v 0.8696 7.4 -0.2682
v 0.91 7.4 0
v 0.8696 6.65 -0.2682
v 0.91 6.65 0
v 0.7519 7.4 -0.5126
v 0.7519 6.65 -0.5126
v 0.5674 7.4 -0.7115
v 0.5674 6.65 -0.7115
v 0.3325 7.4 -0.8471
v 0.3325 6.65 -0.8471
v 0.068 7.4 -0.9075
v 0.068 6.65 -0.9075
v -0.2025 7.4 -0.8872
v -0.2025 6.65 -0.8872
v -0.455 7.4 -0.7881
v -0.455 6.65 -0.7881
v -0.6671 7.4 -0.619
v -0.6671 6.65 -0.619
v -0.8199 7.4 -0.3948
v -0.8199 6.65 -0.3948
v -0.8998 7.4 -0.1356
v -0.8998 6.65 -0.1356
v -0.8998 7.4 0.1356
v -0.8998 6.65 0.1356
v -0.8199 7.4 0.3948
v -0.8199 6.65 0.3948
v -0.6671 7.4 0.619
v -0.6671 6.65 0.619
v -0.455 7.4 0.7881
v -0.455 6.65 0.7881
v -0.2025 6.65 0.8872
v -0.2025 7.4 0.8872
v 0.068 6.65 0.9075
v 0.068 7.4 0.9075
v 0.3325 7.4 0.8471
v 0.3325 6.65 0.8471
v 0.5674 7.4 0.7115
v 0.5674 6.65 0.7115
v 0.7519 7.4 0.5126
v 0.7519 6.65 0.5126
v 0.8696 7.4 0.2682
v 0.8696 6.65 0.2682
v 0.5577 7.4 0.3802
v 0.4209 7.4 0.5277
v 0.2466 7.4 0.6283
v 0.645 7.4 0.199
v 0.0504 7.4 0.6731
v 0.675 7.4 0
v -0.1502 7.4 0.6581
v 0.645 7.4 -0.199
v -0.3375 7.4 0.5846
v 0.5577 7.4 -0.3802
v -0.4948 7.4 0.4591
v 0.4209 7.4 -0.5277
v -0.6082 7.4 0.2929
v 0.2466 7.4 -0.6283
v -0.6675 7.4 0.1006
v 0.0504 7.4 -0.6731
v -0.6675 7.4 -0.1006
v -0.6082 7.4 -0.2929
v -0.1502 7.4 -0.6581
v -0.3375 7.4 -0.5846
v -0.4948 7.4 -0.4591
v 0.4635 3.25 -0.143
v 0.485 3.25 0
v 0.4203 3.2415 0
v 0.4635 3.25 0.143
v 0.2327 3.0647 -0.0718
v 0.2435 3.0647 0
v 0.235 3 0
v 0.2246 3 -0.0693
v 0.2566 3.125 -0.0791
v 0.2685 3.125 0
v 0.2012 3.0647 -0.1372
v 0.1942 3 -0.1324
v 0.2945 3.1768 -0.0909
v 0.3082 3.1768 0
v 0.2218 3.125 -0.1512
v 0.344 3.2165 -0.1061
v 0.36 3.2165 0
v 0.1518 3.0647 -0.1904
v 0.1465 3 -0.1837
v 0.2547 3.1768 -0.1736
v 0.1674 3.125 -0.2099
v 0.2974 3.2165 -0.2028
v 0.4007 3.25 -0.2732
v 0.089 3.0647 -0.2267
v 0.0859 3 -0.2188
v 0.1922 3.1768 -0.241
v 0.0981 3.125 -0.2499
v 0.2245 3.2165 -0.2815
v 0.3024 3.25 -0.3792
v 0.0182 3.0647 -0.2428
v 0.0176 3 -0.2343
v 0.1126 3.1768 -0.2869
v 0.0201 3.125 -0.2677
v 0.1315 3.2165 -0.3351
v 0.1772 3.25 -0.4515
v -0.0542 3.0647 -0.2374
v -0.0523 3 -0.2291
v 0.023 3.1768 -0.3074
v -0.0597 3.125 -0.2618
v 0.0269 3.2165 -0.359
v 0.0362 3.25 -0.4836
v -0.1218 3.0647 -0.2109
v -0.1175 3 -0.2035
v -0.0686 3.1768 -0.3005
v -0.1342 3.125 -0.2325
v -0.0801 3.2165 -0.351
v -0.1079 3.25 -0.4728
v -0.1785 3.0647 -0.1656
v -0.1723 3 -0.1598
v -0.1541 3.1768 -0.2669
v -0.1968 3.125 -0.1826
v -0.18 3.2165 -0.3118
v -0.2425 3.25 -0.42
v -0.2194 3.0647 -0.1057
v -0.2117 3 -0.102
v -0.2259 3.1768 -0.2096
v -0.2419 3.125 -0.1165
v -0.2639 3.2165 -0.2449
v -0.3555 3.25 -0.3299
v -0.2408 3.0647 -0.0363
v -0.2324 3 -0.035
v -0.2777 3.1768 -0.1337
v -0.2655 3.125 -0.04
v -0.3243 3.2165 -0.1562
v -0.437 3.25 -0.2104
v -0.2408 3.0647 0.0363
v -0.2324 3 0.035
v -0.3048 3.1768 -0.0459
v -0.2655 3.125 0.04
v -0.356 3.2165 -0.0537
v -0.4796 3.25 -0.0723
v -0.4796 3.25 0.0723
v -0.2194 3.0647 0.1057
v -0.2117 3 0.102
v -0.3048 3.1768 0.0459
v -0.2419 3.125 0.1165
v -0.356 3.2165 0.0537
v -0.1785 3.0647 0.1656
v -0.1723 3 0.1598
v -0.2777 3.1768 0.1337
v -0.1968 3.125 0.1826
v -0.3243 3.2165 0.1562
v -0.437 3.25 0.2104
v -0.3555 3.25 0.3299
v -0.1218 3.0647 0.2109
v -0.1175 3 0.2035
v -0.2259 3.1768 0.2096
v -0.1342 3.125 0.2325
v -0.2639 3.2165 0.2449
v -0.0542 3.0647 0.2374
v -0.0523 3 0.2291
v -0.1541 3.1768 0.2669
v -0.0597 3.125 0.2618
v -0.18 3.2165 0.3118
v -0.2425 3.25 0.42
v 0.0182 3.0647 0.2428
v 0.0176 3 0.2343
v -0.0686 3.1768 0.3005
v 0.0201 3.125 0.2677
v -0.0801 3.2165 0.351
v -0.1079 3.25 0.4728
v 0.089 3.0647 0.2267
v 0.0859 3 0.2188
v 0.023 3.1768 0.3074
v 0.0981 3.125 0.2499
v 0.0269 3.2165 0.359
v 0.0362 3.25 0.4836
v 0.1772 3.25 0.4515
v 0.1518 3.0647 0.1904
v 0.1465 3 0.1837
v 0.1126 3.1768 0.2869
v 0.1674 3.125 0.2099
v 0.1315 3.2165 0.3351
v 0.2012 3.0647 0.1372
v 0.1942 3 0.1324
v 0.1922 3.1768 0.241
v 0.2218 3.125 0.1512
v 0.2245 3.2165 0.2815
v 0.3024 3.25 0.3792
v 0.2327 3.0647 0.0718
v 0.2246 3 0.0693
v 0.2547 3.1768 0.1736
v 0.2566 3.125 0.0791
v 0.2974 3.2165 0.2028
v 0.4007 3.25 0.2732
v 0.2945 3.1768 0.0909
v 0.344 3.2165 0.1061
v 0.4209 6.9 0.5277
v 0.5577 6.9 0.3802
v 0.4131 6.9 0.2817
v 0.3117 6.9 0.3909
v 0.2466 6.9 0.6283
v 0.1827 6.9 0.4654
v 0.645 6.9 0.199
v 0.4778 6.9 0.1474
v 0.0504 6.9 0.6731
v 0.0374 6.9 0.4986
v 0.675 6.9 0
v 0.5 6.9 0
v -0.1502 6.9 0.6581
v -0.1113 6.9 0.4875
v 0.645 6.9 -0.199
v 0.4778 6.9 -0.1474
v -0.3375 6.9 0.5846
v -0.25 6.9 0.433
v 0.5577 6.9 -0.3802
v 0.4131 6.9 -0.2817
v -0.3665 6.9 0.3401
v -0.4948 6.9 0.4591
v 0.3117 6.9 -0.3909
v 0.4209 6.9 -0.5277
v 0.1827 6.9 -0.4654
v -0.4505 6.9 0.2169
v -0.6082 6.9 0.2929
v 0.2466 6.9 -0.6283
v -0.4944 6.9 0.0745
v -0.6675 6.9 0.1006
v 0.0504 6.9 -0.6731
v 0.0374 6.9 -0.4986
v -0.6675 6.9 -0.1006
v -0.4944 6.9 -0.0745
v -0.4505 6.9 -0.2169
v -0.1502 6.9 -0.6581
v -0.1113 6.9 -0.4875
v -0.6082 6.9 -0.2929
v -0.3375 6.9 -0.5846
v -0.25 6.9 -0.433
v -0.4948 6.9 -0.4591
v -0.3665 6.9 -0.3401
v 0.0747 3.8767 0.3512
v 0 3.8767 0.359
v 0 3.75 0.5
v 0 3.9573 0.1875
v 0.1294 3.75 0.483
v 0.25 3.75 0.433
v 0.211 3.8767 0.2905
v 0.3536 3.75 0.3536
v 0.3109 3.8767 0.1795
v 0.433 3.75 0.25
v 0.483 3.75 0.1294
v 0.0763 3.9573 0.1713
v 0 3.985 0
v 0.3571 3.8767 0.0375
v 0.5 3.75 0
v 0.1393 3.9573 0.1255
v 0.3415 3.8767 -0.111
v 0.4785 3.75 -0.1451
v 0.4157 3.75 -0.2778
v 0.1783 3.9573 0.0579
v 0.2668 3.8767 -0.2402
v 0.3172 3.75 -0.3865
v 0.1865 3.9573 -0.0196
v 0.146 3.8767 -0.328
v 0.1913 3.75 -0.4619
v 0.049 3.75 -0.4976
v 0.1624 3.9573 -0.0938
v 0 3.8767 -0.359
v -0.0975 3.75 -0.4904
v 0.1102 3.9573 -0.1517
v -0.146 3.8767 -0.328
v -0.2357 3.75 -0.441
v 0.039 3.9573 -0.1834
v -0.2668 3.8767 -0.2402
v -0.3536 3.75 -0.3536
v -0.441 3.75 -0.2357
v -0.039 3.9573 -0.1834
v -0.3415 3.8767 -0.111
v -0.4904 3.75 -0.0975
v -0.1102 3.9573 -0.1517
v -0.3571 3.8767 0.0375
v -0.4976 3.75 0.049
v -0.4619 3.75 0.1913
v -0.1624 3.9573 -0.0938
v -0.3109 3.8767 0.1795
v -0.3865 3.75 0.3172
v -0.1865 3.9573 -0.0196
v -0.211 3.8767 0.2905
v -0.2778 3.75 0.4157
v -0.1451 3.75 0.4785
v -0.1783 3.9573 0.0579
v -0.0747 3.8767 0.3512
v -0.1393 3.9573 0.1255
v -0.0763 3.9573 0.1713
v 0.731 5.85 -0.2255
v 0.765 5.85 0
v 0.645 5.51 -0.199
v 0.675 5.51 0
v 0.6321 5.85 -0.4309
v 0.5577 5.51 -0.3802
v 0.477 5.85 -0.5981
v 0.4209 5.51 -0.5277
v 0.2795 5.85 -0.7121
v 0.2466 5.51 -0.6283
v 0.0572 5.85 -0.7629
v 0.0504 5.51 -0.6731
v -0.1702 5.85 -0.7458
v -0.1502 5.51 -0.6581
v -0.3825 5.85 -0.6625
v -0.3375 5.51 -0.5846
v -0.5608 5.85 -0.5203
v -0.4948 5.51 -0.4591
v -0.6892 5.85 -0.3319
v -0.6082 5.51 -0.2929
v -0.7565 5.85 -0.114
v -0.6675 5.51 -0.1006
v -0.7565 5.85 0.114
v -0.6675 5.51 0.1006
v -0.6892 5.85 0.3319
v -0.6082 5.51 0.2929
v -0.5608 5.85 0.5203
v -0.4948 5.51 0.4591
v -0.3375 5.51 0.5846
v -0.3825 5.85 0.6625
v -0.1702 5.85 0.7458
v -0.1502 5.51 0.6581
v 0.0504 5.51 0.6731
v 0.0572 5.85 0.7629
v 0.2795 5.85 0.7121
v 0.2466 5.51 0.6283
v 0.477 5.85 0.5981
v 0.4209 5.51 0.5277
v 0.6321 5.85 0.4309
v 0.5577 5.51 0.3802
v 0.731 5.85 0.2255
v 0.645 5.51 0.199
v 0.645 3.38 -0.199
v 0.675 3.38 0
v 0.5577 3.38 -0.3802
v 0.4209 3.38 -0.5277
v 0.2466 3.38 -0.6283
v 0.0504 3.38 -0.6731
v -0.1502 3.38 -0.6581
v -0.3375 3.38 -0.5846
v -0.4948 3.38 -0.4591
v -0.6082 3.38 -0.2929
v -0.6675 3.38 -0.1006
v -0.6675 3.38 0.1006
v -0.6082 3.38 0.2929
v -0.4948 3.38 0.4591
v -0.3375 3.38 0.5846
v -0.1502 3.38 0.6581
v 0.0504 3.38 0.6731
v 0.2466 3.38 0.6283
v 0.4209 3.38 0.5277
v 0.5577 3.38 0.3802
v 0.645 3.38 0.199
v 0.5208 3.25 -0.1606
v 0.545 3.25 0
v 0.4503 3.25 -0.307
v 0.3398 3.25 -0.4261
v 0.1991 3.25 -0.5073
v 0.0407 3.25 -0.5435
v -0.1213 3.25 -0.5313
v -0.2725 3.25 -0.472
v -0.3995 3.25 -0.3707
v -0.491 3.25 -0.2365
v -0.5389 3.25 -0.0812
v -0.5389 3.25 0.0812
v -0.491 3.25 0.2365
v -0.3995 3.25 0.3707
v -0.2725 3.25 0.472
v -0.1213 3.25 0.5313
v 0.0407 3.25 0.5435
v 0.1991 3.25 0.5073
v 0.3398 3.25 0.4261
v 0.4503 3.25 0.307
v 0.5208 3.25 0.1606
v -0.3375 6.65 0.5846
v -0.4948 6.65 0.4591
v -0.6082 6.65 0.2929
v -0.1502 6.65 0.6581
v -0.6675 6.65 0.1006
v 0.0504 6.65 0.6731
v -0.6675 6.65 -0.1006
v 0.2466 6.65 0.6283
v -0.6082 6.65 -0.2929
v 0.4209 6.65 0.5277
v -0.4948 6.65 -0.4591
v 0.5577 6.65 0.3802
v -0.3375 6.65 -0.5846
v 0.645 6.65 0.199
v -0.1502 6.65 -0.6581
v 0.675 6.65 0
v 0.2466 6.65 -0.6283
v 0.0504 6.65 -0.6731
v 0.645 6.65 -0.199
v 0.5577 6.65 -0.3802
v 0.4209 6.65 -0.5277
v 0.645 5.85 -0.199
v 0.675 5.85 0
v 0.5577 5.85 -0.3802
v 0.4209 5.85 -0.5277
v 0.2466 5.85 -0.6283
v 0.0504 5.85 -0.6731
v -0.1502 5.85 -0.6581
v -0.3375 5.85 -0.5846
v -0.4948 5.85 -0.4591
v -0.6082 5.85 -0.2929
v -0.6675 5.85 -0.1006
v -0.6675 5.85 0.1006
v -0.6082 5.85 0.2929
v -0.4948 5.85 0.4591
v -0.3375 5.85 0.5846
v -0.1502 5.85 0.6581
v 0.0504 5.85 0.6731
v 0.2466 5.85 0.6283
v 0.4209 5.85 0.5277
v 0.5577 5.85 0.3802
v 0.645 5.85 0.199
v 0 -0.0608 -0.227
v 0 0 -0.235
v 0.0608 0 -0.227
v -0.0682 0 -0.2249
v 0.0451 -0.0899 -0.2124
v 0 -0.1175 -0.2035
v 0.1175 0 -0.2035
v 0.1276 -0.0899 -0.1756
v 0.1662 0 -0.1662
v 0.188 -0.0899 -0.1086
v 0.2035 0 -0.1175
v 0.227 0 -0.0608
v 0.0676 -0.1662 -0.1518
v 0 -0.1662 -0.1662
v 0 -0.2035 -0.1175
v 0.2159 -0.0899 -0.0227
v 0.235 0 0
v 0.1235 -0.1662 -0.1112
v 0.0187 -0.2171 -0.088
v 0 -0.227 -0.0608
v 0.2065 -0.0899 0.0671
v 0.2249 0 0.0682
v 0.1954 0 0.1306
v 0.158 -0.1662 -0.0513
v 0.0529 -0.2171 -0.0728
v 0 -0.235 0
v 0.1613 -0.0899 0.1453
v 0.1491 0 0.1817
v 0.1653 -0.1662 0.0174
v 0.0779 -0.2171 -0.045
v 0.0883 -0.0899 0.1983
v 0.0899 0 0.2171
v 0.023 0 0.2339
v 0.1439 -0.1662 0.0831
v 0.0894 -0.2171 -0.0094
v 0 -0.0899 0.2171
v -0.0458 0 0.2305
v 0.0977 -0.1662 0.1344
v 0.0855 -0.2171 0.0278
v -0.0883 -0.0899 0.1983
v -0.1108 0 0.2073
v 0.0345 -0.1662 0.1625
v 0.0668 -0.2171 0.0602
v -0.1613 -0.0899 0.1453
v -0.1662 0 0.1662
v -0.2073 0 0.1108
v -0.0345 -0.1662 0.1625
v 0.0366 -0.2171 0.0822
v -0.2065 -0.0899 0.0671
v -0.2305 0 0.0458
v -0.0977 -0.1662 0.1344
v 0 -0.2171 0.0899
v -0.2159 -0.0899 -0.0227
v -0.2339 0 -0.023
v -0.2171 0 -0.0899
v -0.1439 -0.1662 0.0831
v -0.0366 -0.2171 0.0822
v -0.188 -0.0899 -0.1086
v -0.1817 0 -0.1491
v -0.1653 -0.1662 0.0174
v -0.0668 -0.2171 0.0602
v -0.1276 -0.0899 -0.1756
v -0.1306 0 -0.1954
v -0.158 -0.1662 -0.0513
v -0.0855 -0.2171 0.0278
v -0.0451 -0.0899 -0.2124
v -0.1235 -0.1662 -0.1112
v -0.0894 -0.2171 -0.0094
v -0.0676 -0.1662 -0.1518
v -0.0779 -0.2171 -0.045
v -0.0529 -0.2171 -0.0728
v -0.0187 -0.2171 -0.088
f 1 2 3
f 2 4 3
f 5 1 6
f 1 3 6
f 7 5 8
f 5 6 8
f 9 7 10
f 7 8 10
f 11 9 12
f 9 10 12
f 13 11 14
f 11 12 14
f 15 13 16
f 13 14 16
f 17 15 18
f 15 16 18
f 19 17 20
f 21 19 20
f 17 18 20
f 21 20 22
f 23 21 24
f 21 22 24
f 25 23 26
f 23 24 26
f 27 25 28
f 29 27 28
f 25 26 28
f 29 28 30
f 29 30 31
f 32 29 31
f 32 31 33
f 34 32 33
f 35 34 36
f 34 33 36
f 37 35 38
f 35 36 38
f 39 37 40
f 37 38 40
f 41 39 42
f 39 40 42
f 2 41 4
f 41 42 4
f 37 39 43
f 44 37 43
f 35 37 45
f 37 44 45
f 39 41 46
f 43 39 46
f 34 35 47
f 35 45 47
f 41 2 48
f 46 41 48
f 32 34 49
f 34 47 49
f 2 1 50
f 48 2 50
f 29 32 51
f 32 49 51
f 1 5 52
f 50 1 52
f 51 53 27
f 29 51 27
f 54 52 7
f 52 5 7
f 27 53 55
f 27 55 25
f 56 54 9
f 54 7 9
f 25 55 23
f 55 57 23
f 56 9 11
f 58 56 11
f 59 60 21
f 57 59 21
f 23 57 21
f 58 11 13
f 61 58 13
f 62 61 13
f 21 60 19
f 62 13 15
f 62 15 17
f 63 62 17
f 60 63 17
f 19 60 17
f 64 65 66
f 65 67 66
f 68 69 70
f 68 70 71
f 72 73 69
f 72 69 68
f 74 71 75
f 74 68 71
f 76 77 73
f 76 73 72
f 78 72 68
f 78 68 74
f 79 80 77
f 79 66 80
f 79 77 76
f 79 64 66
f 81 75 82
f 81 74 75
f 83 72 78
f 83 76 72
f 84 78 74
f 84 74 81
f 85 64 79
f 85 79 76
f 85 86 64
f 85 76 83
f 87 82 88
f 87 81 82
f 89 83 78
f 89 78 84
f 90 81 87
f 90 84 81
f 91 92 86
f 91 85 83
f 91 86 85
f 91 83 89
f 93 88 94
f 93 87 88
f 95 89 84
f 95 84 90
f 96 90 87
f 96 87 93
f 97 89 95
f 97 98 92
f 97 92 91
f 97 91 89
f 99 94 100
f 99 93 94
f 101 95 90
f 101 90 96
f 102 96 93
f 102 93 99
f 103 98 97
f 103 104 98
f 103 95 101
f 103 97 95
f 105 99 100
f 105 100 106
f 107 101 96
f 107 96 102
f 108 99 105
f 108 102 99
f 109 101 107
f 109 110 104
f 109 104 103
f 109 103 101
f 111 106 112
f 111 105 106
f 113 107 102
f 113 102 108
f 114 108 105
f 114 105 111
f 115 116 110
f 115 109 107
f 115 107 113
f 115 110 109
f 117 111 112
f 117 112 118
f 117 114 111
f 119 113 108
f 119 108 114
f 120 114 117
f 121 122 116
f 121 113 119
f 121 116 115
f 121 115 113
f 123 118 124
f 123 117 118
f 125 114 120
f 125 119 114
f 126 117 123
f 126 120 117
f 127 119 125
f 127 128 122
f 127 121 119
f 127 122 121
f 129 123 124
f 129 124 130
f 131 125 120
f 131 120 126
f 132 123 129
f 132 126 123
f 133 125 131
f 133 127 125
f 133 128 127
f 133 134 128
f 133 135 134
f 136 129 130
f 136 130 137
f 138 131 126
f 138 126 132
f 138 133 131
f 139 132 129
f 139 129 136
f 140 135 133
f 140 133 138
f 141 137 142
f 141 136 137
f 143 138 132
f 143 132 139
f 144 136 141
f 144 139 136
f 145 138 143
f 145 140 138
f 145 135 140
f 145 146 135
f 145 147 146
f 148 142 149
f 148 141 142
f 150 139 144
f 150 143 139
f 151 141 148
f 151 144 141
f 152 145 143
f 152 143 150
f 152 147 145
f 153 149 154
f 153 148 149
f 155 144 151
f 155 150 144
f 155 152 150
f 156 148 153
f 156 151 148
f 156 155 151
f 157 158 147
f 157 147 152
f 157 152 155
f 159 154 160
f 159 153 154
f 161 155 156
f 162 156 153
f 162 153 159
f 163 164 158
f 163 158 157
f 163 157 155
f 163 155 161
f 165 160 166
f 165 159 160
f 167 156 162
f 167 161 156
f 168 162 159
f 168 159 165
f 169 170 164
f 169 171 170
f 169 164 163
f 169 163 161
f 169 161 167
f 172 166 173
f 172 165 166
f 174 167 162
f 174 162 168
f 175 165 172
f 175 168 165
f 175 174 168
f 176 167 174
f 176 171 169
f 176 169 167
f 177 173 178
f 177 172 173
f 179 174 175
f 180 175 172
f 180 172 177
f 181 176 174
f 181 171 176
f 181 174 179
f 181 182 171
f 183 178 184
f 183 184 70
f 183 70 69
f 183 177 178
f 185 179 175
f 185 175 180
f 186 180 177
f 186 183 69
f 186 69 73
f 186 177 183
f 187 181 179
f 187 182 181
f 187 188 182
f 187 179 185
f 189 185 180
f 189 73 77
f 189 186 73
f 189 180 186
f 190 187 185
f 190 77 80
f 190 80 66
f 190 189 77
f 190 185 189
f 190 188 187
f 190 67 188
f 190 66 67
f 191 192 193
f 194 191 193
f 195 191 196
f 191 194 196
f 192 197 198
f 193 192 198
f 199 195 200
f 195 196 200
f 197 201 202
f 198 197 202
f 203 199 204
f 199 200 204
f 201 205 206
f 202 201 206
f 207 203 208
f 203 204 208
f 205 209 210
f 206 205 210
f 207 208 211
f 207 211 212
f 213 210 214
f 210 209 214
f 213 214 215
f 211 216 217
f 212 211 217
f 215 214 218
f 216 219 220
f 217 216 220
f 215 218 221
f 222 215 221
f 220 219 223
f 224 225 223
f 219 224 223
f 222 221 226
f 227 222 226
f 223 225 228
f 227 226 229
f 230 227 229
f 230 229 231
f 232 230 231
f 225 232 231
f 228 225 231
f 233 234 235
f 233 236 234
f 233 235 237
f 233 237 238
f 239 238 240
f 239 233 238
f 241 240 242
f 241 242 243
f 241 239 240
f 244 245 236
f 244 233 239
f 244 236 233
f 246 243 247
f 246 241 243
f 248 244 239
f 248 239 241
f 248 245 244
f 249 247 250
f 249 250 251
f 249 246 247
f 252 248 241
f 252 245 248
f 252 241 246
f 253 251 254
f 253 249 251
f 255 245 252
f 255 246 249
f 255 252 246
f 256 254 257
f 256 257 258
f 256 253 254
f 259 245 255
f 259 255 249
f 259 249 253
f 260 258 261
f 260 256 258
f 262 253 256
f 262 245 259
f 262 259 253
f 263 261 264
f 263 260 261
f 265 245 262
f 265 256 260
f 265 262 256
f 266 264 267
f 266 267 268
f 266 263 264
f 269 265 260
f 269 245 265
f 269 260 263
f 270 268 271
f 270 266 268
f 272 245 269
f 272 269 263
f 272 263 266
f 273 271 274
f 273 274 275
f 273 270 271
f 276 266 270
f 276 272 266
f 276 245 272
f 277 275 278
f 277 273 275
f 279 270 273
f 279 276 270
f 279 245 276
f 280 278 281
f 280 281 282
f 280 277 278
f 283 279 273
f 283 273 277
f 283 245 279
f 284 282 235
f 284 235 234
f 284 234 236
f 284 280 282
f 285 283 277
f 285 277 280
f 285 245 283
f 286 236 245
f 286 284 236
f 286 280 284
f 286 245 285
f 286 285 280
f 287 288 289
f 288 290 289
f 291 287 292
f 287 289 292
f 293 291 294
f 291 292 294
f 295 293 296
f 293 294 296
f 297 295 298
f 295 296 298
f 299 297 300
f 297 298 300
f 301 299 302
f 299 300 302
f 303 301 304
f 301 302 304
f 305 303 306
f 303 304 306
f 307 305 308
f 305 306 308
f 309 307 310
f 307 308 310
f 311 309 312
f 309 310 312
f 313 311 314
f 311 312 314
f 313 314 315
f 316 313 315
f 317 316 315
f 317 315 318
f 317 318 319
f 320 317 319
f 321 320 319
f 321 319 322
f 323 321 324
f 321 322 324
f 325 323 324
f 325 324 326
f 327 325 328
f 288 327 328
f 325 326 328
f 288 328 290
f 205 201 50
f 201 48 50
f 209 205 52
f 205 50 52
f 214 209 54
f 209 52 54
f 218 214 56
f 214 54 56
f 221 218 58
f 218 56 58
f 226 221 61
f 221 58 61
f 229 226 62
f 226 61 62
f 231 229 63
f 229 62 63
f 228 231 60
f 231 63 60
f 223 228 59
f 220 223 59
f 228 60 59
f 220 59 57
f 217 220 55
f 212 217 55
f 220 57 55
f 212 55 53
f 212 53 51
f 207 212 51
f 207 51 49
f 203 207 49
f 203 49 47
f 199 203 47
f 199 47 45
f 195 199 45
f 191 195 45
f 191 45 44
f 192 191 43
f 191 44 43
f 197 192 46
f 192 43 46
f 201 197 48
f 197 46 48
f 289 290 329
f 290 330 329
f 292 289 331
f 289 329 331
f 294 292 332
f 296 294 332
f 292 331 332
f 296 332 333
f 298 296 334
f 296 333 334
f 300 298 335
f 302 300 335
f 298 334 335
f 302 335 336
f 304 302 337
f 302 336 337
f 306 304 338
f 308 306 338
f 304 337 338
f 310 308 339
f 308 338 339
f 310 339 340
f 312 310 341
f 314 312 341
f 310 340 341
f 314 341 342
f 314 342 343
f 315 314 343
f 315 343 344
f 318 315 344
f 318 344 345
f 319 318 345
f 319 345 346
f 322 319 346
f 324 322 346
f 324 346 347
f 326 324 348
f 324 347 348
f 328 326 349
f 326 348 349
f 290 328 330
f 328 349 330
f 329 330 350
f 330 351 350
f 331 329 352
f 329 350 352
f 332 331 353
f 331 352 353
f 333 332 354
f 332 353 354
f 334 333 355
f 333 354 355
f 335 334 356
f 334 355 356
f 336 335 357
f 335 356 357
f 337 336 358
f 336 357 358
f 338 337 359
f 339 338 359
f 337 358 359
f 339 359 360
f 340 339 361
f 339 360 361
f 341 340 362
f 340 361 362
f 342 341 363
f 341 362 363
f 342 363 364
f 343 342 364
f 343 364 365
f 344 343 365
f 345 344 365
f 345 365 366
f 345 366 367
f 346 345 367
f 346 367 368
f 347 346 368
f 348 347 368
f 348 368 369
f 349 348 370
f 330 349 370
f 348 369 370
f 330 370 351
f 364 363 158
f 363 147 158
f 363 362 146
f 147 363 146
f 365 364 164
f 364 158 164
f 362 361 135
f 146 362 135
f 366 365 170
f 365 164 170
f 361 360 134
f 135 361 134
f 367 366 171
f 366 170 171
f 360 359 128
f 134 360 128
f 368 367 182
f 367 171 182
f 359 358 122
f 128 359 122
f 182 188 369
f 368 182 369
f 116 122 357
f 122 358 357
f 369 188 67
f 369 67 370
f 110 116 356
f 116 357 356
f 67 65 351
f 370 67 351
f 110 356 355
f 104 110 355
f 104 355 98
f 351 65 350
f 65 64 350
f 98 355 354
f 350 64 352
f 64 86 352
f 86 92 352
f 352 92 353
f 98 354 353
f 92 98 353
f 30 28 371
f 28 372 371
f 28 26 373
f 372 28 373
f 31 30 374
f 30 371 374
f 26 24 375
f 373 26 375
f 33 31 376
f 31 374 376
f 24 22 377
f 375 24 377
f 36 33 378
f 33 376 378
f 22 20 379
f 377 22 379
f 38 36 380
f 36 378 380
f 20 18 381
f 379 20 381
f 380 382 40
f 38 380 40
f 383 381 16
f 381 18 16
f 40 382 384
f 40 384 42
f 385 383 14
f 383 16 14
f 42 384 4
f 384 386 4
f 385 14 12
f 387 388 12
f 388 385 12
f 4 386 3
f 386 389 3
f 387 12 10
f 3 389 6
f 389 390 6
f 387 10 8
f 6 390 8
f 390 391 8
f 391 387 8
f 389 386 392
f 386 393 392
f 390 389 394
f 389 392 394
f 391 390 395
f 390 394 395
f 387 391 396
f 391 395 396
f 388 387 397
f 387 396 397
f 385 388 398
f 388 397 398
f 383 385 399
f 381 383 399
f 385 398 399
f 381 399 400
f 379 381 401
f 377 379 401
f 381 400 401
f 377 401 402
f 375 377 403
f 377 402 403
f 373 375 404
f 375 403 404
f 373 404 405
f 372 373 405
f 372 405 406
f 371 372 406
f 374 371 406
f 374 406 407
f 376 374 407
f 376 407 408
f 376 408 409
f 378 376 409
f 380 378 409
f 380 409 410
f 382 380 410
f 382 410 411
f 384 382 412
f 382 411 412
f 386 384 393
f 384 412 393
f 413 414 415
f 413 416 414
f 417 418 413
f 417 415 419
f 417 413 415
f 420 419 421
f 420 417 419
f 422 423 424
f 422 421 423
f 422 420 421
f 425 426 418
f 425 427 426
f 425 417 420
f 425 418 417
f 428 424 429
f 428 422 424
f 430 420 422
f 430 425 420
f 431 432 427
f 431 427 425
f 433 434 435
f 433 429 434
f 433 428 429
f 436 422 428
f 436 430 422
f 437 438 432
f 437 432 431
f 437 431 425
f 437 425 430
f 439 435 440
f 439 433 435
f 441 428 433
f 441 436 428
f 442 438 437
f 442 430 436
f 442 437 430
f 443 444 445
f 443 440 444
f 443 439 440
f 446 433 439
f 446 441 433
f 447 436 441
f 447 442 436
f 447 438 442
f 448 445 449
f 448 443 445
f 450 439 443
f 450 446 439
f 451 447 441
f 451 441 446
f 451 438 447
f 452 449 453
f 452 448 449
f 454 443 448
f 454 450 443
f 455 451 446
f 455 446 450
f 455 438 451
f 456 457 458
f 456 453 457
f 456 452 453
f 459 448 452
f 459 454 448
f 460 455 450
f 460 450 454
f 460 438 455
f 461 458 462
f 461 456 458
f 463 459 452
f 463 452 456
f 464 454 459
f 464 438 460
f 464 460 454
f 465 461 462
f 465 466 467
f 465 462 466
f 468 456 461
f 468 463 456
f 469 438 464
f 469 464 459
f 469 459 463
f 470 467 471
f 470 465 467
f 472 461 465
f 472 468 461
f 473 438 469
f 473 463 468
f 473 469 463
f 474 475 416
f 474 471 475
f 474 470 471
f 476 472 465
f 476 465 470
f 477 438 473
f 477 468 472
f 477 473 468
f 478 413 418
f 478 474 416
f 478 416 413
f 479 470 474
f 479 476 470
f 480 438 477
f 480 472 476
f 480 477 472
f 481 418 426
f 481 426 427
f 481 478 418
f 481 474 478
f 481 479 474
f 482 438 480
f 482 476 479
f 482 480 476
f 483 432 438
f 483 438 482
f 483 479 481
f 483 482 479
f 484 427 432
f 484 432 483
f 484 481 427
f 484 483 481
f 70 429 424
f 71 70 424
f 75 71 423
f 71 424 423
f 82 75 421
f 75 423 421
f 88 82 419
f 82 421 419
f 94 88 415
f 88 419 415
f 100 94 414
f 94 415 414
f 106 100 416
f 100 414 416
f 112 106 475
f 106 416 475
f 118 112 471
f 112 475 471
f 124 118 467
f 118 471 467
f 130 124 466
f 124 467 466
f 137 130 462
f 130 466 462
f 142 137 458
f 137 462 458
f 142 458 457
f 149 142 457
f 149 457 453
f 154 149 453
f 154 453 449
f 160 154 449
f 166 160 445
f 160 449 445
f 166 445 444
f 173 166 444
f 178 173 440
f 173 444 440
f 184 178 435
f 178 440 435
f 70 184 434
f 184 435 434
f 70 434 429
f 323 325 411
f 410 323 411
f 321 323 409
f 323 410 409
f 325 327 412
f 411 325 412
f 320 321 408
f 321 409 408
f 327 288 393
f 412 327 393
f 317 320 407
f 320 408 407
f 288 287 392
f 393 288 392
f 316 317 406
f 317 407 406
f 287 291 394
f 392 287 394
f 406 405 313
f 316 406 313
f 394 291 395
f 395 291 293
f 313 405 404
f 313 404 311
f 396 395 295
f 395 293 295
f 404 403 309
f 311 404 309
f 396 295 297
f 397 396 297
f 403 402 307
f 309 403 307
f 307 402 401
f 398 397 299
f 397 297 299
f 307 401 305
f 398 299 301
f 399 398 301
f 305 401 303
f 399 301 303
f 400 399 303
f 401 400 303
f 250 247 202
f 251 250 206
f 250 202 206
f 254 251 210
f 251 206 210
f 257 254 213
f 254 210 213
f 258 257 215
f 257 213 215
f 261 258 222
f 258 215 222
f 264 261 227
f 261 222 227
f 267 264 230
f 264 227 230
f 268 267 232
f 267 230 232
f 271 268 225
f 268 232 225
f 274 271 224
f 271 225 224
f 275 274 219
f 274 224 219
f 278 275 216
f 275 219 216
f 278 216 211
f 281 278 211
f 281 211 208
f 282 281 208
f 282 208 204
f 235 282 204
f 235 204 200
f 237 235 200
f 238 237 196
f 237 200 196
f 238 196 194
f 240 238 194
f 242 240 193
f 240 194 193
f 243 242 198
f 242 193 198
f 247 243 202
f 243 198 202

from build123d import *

# Parameters (mm, degrees)
DOME1_FACE_RADIUS = 0.5
DOME1_HEIGHT      = 0.235
DOME2_FACE_RADIUS = 0.235
DOME2_HEIGHT      = 0.235
FILLET1_R         = 0.25


with BuildPart() as part:
    # Sketch1 → Revolve1 (revolve)
    with BuildSketch(Plane.XY):
        Polygon((0, 0), (0, 3.75), (0.5, 3.75), (0.5, 6.9), (0.675, 6.9), (0.675, 7.4), (0.91, 7.4), (0.91, 6.65), (0.675, 6.65), (0.675, 5.85), (0.765, 5.85), (0.675, 5.51), (0.675, 3.38), (0.545, 3.25), (0.235, 3.25), (0.235, 0), align=None)
    revolve(axis=Axis((0, 0, 0), (0, 1, 0)))

    # Dome1: a dome of height H over a round flat face of radius A is a cap of a sphere of radius (A * A + H * H) / (2 * H)
    dome1_r = (DOME1_FACE_RADIUS * DOME1_FACE_RADIUS + DOME1_HEIGHT * DOME1_HEIGHT) / (2 * DOME1_HEIGHT)
    dome1_base = Plane((0, 3.75, 0), z_dir=(0, 1, 0))
    with Locations(dome1_base.offset(DOME1_HEIGHT - dome1_r)):
        dome1_ball = Sphere(dome1_r, mode=Mode.PRIVATE)
    add(split(dome1_ball, bisect_by=dome1_base, keep=Keep.TOP, mode=Mode.PRIVATE))

    # Dome2: a dome of height H over a round flat face of radius A is a cap of a sphere of radius (A * A + H * H) / (2 * H)
    dome2_r = (DOME2_FACE_RADIUS * DOME2_FACE_RADIUS + DOME2_HEIGHT * DOME2_HEIGHT) / (2 * DOME2_HEIGHT)
    dome2_base = Plane((0, 0, 0), z_dir=(0, -1, 0))
    with Locations(dome2_base.offset(DOME2_HEIGHT - dome2_r)):
        dome2_ball = Sphere(dome2_r, mode=Mode.PRIVATE)
    add(split(dome2_ball, bisect_by=dome2_base, keep=Keep.TOP, mode=Mode.PRIVATE))

    # Fillet1
    fillet1_edges = [part.edges().sort_by_distance(p)[0] for p in [
        (-0.235, 3.25, 0),
    ]]
    fillet(fillet1_edges, radius=FILLET1_R)


solid = part.part
